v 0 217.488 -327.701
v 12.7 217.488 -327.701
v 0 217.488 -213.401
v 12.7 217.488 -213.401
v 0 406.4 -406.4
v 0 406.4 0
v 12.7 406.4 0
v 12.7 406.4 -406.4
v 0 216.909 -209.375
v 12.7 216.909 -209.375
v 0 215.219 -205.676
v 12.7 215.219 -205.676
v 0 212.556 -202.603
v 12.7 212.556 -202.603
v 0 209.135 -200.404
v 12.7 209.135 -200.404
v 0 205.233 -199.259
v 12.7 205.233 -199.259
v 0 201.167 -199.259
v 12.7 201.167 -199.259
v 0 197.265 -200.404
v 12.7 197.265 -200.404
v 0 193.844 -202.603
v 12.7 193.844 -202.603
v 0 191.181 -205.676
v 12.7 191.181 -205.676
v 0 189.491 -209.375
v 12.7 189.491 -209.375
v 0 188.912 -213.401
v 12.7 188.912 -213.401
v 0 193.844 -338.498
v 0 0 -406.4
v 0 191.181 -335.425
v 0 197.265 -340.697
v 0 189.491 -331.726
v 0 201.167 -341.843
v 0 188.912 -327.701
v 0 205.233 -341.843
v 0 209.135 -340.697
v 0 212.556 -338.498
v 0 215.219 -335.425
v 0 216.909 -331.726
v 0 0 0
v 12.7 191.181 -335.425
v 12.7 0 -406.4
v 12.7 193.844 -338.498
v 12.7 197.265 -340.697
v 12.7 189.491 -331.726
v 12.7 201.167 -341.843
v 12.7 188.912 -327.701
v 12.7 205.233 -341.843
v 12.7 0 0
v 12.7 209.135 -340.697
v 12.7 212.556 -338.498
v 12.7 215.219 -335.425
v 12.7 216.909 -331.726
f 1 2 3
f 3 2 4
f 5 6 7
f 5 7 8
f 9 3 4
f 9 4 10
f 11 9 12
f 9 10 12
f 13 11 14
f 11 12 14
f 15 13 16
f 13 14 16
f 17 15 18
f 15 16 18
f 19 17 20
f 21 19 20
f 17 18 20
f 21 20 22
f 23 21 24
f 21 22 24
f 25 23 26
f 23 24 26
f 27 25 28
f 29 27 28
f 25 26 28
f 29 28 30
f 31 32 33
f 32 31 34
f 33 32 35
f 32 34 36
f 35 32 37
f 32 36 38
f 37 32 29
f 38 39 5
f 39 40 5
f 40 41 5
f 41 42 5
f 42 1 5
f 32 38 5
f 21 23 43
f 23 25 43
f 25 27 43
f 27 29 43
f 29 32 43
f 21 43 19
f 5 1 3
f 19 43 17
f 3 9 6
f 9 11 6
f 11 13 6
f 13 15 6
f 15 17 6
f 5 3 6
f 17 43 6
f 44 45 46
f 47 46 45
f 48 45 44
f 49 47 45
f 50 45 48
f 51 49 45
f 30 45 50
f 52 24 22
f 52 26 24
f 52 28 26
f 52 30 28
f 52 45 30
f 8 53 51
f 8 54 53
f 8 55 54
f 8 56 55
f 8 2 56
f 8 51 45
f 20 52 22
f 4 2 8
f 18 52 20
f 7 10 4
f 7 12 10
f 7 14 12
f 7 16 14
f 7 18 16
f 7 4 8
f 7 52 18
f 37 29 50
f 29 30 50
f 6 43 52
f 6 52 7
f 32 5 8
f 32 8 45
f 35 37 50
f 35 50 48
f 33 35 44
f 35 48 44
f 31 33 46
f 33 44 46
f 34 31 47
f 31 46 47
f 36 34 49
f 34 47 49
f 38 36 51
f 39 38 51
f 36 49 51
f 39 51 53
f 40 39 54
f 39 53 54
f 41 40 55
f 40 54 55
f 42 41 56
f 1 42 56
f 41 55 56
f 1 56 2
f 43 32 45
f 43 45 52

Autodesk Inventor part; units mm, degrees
ref_plane "YZ Plane" through (0, 0, 0) normal (1, 0, 0) x (0, 1, 0)
ref_plane "XZ Plane" through (0, 0, 0) normal (0, 1, 0) x (-1, 0, 0)
ref_plane "XY Plane" through (0, 0, 0) normal (0, 0, 1) x (1, 0, 0)
sketch "Sketch1" plane through (0, 0, 0) normal (1, 0, 0) x (0, 1, 0)
  line L0 (0, 0) -> (406.4, 0)
  line L1 (406.4, 0) -> (406.4, -406.4)
  line L2 (406.4, -406.4) -> (0, -406.4)
  line L3 (0, -406.4) -> (0, 0)
  dimension "d0" = 406.4
  dimension "d1" = 406.4
extrude "Extrusion1" add sketch "Sketch1" along normal blind 12.7
sketch "Sketch2" plane through (12.7, 0, 0) normal (1, 0, 0) x (0, 0, -1)
  arc A0 (253.151, 217.4875) -> (253.151, 188.9125) centre (133.35, 203.2) ccw
  arc A1 (278.9512, 188.9125) -> (278.9512, 217.4875) centre (327.7007, 203.2) ccw
  line L0 (0, 406.4) -> (0, 0) projected
  line L1 (406.4, 406.4) -> (0, 406.4) projected
  line L2 (327.7007, 203.2) -> (213.4007, 203.2) construction
  line L3 (327.7007, 217.4875) -> (213.4007, 217.4875)
  line L4 (213.4007, 188.9125) -> (327.7007, 188.9125)
  arc A2 (327.7007, 188.9125) -> (327.7007, 217.4875) centre (327.7007, 203.2) ccw
  arc A3 (213.4007, 217.4875) -> (213.4007, 188.9125) centre (213.4007, 203.2) ccw
  point P0 (270.5507, 203.2)
  dimension "d4" = 241.3
  dimension "d5" = 101.6
  dimension "d6" = 133.35
  dimension "d7" = 12.7
  dimension "d8" = 203.2
  dimension "d9" = 203.2
  dimension "d10" = 114.3
  dimension "d11" = 28.575
extrude "Extrusion2" cut sketch "Sketch2" against normal blind 25.4 contours L3 A2 L4 A3
properties part number "Prototype Panel2"
